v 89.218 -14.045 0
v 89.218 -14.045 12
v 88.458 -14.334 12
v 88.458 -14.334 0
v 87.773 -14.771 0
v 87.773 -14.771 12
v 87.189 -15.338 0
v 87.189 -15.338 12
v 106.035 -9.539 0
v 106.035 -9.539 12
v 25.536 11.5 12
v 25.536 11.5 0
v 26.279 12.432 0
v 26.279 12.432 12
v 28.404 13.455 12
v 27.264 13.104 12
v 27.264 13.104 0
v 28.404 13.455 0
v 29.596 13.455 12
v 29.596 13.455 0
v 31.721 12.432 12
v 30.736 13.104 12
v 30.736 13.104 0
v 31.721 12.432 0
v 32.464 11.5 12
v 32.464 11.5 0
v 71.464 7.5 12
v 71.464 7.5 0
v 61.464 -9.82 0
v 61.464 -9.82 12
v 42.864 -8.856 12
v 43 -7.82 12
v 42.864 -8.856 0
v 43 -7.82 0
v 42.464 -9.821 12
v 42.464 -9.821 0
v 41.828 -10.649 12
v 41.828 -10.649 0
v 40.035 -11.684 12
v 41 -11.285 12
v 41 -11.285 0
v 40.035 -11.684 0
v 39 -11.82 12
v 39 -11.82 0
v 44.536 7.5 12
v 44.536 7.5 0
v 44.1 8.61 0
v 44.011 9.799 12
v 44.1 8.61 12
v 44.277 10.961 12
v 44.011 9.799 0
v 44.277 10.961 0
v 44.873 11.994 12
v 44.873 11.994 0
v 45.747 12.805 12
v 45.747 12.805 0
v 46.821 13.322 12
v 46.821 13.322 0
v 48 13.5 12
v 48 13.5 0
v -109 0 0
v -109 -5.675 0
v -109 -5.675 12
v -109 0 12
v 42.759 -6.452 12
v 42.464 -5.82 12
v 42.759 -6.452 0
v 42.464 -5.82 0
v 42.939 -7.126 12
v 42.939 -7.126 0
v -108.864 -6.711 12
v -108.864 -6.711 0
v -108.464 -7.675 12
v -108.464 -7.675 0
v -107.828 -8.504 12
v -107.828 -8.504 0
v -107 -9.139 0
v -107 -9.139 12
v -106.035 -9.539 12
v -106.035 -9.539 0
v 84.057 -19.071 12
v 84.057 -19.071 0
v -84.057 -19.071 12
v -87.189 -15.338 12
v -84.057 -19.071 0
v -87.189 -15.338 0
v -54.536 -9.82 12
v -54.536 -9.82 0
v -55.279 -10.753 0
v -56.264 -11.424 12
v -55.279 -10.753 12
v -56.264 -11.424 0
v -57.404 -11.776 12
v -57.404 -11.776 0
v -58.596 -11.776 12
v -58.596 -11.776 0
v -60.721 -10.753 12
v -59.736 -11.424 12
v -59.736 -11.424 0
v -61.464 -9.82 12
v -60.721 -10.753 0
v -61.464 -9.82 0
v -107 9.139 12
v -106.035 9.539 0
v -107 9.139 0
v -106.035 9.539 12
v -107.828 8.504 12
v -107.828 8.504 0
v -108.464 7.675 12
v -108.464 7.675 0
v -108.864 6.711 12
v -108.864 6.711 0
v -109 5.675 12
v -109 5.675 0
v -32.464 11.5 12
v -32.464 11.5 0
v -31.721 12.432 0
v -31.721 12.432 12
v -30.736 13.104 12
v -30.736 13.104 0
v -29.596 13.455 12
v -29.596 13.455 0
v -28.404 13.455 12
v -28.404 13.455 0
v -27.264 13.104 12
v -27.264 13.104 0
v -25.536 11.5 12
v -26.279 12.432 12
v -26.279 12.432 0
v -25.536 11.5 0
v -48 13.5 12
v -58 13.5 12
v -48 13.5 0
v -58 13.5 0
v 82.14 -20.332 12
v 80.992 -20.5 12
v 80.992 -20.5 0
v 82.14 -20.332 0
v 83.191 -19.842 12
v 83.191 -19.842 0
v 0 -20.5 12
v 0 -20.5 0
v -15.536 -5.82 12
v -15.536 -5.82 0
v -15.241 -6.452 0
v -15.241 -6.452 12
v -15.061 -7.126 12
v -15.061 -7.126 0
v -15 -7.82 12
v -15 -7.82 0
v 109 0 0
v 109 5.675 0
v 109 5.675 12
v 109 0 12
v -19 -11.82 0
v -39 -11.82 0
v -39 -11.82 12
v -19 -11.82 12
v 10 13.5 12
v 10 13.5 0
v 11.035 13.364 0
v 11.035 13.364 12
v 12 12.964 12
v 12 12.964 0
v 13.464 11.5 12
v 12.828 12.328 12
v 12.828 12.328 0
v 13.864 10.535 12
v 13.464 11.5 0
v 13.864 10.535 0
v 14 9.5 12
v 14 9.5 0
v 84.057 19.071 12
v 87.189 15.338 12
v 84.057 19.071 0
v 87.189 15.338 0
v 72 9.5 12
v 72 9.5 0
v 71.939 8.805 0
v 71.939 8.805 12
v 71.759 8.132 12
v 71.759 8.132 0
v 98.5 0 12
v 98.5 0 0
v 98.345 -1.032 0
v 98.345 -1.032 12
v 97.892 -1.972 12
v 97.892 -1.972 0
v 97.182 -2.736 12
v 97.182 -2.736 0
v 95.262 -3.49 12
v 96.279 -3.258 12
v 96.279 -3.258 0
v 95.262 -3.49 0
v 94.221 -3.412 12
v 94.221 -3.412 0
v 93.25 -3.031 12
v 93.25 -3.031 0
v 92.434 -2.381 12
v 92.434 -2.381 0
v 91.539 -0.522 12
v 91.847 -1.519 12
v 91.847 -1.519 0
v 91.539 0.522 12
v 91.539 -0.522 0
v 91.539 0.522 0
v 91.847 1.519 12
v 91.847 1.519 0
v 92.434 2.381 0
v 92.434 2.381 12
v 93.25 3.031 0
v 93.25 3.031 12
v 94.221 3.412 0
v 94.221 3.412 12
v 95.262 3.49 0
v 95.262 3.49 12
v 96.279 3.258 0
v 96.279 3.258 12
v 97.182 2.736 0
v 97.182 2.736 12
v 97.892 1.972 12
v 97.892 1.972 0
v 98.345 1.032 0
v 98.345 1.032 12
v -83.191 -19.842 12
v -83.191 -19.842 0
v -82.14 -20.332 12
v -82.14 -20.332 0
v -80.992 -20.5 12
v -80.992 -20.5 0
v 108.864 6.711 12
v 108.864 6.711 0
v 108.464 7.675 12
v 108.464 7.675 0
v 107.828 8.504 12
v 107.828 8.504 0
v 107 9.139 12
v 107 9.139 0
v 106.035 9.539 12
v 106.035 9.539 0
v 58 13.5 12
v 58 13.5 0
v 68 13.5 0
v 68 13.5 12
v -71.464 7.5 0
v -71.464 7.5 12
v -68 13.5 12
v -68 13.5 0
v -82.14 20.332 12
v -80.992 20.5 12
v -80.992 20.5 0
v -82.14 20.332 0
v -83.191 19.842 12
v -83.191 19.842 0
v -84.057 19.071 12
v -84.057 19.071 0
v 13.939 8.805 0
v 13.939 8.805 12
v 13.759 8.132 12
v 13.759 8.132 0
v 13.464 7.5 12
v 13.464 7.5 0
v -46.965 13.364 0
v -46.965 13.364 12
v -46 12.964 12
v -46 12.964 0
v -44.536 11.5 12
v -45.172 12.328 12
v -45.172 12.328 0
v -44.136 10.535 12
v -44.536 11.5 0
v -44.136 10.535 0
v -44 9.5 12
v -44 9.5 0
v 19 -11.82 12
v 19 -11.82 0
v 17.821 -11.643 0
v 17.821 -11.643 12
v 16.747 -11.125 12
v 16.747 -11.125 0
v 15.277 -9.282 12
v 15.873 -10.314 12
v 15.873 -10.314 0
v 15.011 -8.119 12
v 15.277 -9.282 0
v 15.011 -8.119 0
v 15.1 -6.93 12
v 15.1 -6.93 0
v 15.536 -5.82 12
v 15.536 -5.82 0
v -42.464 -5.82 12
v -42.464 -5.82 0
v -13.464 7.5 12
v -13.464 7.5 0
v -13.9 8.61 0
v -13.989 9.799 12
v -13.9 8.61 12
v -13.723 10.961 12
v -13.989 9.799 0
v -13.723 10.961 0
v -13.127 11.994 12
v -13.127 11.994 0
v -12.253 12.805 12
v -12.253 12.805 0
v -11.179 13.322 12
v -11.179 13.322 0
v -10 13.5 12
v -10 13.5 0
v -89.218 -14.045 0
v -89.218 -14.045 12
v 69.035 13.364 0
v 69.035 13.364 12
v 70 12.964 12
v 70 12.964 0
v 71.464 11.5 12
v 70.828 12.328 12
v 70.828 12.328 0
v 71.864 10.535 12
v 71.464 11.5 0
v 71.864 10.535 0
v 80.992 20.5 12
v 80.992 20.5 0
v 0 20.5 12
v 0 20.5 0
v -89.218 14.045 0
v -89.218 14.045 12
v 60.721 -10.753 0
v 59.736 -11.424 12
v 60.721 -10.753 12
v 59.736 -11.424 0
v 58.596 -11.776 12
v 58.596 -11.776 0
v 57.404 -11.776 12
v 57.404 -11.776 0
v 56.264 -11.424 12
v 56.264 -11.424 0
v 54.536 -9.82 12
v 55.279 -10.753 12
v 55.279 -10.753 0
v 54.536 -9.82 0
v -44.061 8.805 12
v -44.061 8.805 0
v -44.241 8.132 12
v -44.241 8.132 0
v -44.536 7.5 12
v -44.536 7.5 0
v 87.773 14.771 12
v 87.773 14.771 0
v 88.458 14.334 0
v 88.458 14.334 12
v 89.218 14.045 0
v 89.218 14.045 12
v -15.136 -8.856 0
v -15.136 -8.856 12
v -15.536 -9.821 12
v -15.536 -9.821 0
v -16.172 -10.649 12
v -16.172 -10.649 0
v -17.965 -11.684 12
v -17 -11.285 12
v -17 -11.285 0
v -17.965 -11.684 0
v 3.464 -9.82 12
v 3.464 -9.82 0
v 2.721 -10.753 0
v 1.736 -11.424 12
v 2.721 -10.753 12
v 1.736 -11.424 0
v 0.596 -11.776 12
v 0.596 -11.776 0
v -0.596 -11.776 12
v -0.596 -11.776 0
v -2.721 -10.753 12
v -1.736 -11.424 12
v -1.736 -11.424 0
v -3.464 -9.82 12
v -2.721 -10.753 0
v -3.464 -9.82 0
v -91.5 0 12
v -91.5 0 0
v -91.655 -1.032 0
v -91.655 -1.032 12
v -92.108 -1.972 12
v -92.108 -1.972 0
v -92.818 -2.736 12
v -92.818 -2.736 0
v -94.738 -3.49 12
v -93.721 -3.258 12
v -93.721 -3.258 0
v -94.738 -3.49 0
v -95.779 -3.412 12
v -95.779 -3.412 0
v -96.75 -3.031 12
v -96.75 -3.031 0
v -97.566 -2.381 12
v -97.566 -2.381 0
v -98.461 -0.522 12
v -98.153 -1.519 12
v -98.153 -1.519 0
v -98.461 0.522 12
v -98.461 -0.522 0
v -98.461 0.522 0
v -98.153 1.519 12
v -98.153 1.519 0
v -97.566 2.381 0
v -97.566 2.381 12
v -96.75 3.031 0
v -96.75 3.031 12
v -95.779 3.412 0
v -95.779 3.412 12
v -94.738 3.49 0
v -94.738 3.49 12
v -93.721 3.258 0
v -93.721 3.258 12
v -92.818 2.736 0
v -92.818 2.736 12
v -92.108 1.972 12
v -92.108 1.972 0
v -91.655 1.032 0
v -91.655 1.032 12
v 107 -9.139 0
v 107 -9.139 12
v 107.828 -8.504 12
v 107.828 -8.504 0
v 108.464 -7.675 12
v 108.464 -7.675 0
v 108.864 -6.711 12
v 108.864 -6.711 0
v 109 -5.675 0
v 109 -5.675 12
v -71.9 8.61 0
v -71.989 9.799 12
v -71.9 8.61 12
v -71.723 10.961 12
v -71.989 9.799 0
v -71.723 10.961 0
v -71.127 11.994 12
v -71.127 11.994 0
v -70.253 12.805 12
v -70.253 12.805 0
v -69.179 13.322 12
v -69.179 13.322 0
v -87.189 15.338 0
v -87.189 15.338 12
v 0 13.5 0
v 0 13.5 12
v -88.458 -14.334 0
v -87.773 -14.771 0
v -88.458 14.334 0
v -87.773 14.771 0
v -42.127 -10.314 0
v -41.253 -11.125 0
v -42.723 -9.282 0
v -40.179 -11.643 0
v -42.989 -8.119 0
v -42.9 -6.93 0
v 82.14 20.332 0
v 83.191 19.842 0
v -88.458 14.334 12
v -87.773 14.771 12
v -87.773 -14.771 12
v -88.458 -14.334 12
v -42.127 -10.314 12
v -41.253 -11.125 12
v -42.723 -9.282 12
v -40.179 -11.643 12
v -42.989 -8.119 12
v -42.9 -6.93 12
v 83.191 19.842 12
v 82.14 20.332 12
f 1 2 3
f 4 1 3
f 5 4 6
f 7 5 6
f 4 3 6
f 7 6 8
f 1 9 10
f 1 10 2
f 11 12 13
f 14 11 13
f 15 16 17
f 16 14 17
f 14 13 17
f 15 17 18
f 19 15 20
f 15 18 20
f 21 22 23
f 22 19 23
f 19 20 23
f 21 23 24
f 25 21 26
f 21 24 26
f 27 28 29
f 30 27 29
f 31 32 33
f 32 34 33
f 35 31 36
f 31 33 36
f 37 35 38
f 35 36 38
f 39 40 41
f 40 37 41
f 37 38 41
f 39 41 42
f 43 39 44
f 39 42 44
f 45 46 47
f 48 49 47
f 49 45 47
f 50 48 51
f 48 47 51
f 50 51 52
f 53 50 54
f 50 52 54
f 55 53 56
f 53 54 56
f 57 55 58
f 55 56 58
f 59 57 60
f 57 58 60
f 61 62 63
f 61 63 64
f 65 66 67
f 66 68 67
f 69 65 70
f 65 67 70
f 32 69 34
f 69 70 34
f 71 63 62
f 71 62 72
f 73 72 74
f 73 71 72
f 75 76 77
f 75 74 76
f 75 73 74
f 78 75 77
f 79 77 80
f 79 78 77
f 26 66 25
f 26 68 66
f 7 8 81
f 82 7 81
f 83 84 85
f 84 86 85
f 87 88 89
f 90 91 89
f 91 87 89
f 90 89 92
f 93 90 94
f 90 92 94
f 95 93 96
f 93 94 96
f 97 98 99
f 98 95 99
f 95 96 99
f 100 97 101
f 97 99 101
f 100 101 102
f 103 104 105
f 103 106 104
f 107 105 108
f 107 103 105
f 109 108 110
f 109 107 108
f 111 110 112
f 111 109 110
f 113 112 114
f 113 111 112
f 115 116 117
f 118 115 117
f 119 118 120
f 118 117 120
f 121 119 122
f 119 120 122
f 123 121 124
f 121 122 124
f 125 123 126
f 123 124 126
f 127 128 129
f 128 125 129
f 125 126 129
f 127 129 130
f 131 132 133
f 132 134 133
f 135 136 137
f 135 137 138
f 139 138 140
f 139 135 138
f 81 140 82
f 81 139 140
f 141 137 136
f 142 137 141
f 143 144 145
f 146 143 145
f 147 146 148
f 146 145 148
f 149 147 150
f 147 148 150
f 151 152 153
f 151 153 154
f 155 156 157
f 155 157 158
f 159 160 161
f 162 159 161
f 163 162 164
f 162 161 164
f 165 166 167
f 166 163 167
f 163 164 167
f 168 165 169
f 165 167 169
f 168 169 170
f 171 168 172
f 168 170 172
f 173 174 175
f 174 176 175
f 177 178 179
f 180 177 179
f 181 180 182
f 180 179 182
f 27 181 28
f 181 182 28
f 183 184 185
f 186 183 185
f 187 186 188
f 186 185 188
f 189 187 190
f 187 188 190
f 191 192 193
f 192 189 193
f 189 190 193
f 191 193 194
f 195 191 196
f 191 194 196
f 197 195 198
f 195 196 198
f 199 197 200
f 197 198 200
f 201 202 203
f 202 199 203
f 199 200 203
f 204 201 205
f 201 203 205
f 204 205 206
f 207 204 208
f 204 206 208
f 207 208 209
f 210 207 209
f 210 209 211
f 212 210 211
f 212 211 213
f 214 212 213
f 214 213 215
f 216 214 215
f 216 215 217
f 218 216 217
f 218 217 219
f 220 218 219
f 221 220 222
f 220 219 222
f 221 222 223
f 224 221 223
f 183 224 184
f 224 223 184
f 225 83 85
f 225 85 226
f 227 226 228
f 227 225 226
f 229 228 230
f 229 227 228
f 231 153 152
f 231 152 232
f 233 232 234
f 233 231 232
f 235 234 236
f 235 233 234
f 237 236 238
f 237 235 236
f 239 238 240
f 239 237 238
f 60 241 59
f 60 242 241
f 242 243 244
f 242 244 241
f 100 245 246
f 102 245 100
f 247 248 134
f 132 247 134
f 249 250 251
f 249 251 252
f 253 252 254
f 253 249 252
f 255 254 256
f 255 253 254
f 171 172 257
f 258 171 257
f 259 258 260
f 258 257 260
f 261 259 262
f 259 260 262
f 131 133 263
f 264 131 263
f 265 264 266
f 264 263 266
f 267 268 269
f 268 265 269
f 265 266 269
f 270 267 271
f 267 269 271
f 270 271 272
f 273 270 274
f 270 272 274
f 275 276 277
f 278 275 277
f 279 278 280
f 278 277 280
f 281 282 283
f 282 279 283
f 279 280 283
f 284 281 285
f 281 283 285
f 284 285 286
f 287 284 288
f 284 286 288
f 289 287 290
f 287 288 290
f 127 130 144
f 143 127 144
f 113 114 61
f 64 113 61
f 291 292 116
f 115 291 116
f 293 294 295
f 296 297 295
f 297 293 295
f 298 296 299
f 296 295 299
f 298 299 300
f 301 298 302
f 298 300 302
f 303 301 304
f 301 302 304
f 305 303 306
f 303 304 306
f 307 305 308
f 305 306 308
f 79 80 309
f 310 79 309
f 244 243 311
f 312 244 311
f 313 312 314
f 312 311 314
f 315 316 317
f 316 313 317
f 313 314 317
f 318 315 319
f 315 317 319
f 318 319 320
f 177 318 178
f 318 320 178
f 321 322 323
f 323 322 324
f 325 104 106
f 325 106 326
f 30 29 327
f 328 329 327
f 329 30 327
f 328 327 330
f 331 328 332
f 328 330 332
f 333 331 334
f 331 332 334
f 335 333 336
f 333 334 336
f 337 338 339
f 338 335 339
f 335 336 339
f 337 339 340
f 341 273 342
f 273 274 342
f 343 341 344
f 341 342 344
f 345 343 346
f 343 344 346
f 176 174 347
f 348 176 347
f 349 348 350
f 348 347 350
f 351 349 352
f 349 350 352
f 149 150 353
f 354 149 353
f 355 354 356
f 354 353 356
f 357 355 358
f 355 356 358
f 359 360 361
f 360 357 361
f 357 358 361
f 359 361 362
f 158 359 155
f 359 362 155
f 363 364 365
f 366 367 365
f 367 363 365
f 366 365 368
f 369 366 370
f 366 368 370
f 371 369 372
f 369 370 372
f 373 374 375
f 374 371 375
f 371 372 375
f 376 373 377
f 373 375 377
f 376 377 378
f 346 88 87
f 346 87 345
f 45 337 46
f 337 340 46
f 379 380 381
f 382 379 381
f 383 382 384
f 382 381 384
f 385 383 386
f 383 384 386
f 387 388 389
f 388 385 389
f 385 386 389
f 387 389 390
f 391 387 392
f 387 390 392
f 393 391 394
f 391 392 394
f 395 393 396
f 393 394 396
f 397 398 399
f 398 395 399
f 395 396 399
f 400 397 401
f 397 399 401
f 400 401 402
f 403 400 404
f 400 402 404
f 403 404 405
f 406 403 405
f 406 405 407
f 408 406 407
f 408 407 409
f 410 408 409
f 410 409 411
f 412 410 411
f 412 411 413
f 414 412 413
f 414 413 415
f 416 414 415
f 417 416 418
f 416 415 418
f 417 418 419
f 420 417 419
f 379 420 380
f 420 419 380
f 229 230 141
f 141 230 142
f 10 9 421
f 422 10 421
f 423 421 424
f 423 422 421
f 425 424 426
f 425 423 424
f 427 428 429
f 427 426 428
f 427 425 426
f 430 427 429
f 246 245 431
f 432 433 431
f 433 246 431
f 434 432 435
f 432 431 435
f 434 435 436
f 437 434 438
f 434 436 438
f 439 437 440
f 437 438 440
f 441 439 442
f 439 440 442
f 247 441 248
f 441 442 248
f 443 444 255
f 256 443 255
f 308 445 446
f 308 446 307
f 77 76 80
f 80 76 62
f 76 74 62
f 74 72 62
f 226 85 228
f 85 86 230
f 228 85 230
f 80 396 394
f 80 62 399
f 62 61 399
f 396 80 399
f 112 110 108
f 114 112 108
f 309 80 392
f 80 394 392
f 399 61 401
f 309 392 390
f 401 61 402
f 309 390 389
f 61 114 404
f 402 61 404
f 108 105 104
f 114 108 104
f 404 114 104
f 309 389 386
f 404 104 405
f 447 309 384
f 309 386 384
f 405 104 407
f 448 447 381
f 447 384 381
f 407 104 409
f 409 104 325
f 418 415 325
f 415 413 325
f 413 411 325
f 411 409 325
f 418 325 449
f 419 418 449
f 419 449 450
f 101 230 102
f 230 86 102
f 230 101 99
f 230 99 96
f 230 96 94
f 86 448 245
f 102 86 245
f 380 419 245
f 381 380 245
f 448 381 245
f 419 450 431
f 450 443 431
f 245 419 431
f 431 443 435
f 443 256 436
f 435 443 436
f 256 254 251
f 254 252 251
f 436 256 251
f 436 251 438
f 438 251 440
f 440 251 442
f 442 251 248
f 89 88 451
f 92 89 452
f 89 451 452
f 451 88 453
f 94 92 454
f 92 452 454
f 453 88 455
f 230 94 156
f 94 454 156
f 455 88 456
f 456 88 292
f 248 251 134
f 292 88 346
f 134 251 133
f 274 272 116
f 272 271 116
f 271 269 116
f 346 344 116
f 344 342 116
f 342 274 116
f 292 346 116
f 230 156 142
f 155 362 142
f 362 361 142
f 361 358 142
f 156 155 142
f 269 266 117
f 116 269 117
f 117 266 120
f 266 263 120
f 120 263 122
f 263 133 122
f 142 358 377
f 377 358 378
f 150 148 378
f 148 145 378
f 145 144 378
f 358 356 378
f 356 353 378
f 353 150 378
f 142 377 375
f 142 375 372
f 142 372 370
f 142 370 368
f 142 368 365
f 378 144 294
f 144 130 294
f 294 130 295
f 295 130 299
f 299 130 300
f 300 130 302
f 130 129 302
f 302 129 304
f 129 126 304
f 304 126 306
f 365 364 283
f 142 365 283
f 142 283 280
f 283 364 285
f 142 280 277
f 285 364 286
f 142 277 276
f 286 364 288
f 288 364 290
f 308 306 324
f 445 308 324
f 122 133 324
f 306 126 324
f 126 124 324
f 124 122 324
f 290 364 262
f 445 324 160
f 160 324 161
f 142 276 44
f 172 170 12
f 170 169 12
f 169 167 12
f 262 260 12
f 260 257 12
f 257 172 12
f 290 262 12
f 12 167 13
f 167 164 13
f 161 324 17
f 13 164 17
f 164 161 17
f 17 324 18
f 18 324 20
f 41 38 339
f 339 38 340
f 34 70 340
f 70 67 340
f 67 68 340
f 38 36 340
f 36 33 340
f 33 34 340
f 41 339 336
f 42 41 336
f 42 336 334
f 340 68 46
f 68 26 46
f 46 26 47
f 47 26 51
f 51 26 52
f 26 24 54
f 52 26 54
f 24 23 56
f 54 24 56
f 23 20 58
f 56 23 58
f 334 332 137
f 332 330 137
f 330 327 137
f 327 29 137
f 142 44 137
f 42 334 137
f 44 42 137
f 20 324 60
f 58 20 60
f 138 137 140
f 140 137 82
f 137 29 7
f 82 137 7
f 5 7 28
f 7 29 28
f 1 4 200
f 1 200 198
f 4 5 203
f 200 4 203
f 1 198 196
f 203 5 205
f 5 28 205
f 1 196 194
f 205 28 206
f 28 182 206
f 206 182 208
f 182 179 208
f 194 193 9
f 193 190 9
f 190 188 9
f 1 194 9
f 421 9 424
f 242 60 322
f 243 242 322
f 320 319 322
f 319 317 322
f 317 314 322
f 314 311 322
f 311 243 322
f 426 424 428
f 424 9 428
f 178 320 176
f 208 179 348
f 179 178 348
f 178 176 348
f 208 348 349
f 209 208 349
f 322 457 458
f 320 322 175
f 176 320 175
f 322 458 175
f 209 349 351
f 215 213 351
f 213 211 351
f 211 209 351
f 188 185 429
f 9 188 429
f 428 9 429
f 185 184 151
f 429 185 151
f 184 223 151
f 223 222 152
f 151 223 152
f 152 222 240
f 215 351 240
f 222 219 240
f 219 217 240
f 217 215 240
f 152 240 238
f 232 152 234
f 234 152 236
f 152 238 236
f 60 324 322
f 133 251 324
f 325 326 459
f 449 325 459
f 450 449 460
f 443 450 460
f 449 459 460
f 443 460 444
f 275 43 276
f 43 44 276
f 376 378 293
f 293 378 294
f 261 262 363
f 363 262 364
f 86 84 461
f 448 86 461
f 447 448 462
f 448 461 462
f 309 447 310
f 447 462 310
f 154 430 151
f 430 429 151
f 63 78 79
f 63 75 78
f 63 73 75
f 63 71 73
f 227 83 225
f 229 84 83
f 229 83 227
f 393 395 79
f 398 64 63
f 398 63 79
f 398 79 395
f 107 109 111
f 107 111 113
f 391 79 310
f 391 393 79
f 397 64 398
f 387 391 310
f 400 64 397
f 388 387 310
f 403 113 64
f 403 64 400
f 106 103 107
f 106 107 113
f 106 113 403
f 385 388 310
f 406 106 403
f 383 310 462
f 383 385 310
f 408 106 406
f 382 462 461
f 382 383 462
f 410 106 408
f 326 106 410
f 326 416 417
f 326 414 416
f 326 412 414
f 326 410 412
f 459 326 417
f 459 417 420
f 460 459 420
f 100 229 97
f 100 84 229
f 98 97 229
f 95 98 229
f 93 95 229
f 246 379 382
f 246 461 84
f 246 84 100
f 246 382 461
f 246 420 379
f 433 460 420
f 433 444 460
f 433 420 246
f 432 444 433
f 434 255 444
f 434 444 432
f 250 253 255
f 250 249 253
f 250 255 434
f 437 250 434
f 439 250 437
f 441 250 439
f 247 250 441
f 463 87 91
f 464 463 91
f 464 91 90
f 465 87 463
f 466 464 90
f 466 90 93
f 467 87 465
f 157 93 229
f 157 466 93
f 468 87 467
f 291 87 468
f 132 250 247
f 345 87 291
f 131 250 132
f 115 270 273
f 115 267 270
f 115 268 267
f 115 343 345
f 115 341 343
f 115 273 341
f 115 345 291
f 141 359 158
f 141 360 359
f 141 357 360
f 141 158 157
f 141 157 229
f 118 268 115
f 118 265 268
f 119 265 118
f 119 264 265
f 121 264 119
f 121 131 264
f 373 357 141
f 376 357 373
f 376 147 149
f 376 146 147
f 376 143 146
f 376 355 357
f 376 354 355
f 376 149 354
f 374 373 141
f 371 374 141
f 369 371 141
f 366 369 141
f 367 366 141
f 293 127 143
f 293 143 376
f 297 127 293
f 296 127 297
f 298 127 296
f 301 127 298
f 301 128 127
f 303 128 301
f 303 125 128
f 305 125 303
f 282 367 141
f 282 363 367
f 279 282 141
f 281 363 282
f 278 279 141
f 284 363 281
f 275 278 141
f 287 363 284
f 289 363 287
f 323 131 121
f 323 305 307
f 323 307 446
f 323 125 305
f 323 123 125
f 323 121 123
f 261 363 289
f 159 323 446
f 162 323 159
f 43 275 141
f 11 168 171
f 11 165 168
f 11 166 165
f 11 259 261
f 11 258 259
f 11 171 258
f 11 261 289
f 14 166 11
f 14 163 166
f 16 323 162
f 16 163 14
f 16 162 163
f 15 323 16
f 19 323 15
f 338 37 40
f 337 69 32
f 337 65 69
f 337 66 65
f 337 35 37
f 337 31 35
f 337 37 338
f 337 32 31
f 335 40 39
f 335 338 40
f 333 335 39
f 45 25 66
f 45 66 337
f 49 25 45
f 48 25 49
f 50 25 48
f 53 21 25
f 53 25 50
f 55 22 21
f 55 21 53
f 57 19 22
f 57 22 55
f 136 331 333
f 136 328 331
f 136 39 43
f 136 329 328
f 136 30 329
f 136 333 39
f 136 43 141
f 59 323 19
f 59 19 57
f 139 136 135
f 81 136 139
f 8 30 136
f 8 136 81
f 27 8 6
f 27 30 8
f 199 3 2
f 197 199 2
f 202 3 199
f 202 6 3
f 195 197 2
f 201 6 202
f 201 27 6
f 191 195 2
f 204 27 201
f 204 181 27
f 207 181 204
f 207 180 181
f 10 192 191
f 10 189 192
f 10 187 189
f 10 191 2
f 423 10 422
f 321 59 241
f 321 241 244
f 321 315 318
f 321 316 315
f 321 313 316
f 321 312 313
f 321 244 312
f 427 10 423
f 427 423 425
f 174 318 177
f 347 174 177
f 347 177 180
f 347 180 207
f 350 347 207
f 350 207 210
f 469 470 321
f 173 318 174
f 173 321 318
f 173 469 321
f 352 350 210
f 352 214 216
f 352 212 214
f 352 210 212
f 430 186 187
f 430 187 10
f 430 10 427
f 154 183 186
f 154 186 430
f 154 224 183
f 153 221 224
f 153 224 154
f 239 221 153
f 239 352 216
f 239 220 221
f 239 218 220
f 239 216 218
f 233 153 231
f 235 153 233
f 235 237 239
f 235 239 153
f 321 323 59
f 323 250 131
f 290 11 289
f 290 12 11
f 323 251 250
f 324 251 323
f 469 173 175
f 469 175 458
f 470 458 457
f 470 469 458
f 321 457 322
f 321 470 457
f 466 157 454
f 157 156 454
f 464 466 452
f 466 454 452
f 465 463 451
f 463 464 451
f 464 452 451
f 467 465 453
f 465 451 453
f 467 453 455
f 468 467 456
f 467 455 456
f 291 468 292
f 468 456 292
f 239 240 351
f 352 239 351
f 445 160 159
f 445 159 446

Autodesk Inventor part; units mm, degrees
ref_plane "YZ Plane" through (0, 0, 0) normal (1, 0, 0) x (0, 1, 0)
ref_plane "XZ Plane" through (0, 0, 0) normal (0, 1, 0) x (-1, 0, 0)
ref_plane "XY Plane" through (0, 0, 0) normal (0, 0, 1) x (1, 0, 0)
sketch "Base" plane through (0, 0, 0) normal (0, 0, 1) x (1, 0, 0)
  line L0 (-152.6, 0) -> (152.6, 0) construction
  line L1 (0, -28.7) -> (0, 28.7) construction
  circle A0 centre (-95, 0) radius 3.5
  circle A1 centre (95, 0) radius 3.5
  line L2 (-109, 8.7447) -> (-109, 0)
  line L3 (-109, 8.7447) -> (-88, 14.3716)
  line L4 (-88, 14.3716) -> (-82.8577, 20.5)
  line L5 (-82.8577, 20.5) -> (0, 20.5)
  line L6 (-109, -8.7447) -> (-109, 0)
  line L7 (-109, -8.7447) -> (-88, -14.3716)
  line L8 (-88, -14.3716) -> (-82.8577, -20.5)
  line L9 (-82.8577, -20.5) -> (0, -20.5)
  line L10 (109, 8.7447) -> (109, 0)
  line L11 (109, 8.7447) -> (88, 14.3716)
  line L12 (88, 14.3716) -> (82.8577, 20.5)
  line L13 (82.8577, 20.5) -> (0, 20.5)
  line L14 (82.8577, -20.5) -> (0, -20.5)
  line L15 (88, -14.3716) -> (82.8577, -20.5)
  line L16 (109, -8.7447) -> (88, -14.3716)
  line L17 (109, -8.7447) -> (109, 0)
  circle A2 centre (-68, 9.5) radius 4
  line L18 (-58, 0) -> (-58, 20.5) construction
  line L19 (-68, 13.5) -> (-58, 13.5)
  circle A3 centre (-58, -7.8205) radius 4
  line L20 (-58, 0) -> (-58, -7.8205) construction
  line L21 (-71.4641, 7.5) -> (-61.4641, -9.8205)
  circle A4 centre (-48, 9.5) radius 4
  line L22 (-58, 13.5) -> (-48, 13.5)
  line L23 (-54.5359, -9.8205) -> (-44.5359, 7.5)
  circle A5 centre (-29, 9.5) radius 4
  circle A6 centre (-39, -7.8205) radius 4
  circle A7 centre (-19, -7.8205) radius 4
  line L24 (-48, 13.5) -> (-29, 13.5) construction
  line L25 (-39, -11.8205) -> (-19, -11.8205)
  line L26 (-42.4641, -5.8205) -> (-32.4641, 11.5)
  line L27 (-25.5359, 11.5) -> (-15.5359, -5.8205)
  line L28 (-58, -11.8205) -> (-39, -11.8205) construction
  line L29 (-29, 9.5) -> (-29, -11.8205) construction
  circle A8 centre (10, 9.5) radius 4
  line L30 (10, 13.5) -> (0, 13.5)
  circle A9 centre (0, -7.8205) radius 4
  line L31 (13.4641, 7.5) -> (3.4641, -9.8205)
  circle A10 centre (-10, 9.5) radius 4
  line L32 (0, 13.5) -> (-10, 13.5)
  line L33 (-3.4641, -9.8205) -> (-13.4641, 7.5)
  circle A11 centre (68, 9.5) radius 4
  line L34 (68, 13.5) -> (58, 13.5)
  circle A12 centre (58, -7.8205) radius 4
  line L35 (71.4641, 7.5) -> (61.4641, -9.8205)
  circle A13 centre (48, 9.5) radius 4
  line L36 (58, 13.5) -> (48, 13.5)
  line L37 (54.5359, -9.8205) -> (44.5359, 7.5)
  circle A14 centre (29, 9.5) radius 4
  circle A15 centre (39, -7.8205) radius 4
  circle A16 centre (19, -7.8205) radius 4
  line L38 (39, -11.8205) -> (19, -11.8205)
  line L39 (42.4641, -5.8205) -> (32.4641, 11.5)
  line L40 (25.5359, 11.5) -> (15.5359, -5.8205)
  point P0 (0, 0)
  point P1 (-58, 10.25)
  dimension "d0" = 7
  dimension "d1" = 190
  dimension "d3" = 130
  dimension "d4" = 165
  dimension "d5" = 8
  dimension "d7" = 218
  dimension "d8" = 41
  dimension "d12" = 21
  dimension "d14" = 8
  dimension "d15" = 8
  dimension "d16" = 20
  dimension "d17" = 60
  dimension "d18" = 7
  dimension "d20" = 8.4545
  dimension "d21" = 8.4545
extrude "BaseFeature" add sketch "Base" along normal blind 12
fillet "OutsideFilletsFeature" radius 4 12 edges at (-109, -8.7447, 6) (-109, 8.7447, 6) (-88, -14.3716, 6) (-82.8577, -20.5, 6) (-88, 14.3716, 6) (-82.8577, 20.5, 6) (82.8577, 20.5, 6) (88, 14.3716, 6) (109, -8.7447, 6) (88, -14.3716, 6) (82.8577, -20.5, 6) (109, 8.7447, 6)
properties part number "BatteryMount"
